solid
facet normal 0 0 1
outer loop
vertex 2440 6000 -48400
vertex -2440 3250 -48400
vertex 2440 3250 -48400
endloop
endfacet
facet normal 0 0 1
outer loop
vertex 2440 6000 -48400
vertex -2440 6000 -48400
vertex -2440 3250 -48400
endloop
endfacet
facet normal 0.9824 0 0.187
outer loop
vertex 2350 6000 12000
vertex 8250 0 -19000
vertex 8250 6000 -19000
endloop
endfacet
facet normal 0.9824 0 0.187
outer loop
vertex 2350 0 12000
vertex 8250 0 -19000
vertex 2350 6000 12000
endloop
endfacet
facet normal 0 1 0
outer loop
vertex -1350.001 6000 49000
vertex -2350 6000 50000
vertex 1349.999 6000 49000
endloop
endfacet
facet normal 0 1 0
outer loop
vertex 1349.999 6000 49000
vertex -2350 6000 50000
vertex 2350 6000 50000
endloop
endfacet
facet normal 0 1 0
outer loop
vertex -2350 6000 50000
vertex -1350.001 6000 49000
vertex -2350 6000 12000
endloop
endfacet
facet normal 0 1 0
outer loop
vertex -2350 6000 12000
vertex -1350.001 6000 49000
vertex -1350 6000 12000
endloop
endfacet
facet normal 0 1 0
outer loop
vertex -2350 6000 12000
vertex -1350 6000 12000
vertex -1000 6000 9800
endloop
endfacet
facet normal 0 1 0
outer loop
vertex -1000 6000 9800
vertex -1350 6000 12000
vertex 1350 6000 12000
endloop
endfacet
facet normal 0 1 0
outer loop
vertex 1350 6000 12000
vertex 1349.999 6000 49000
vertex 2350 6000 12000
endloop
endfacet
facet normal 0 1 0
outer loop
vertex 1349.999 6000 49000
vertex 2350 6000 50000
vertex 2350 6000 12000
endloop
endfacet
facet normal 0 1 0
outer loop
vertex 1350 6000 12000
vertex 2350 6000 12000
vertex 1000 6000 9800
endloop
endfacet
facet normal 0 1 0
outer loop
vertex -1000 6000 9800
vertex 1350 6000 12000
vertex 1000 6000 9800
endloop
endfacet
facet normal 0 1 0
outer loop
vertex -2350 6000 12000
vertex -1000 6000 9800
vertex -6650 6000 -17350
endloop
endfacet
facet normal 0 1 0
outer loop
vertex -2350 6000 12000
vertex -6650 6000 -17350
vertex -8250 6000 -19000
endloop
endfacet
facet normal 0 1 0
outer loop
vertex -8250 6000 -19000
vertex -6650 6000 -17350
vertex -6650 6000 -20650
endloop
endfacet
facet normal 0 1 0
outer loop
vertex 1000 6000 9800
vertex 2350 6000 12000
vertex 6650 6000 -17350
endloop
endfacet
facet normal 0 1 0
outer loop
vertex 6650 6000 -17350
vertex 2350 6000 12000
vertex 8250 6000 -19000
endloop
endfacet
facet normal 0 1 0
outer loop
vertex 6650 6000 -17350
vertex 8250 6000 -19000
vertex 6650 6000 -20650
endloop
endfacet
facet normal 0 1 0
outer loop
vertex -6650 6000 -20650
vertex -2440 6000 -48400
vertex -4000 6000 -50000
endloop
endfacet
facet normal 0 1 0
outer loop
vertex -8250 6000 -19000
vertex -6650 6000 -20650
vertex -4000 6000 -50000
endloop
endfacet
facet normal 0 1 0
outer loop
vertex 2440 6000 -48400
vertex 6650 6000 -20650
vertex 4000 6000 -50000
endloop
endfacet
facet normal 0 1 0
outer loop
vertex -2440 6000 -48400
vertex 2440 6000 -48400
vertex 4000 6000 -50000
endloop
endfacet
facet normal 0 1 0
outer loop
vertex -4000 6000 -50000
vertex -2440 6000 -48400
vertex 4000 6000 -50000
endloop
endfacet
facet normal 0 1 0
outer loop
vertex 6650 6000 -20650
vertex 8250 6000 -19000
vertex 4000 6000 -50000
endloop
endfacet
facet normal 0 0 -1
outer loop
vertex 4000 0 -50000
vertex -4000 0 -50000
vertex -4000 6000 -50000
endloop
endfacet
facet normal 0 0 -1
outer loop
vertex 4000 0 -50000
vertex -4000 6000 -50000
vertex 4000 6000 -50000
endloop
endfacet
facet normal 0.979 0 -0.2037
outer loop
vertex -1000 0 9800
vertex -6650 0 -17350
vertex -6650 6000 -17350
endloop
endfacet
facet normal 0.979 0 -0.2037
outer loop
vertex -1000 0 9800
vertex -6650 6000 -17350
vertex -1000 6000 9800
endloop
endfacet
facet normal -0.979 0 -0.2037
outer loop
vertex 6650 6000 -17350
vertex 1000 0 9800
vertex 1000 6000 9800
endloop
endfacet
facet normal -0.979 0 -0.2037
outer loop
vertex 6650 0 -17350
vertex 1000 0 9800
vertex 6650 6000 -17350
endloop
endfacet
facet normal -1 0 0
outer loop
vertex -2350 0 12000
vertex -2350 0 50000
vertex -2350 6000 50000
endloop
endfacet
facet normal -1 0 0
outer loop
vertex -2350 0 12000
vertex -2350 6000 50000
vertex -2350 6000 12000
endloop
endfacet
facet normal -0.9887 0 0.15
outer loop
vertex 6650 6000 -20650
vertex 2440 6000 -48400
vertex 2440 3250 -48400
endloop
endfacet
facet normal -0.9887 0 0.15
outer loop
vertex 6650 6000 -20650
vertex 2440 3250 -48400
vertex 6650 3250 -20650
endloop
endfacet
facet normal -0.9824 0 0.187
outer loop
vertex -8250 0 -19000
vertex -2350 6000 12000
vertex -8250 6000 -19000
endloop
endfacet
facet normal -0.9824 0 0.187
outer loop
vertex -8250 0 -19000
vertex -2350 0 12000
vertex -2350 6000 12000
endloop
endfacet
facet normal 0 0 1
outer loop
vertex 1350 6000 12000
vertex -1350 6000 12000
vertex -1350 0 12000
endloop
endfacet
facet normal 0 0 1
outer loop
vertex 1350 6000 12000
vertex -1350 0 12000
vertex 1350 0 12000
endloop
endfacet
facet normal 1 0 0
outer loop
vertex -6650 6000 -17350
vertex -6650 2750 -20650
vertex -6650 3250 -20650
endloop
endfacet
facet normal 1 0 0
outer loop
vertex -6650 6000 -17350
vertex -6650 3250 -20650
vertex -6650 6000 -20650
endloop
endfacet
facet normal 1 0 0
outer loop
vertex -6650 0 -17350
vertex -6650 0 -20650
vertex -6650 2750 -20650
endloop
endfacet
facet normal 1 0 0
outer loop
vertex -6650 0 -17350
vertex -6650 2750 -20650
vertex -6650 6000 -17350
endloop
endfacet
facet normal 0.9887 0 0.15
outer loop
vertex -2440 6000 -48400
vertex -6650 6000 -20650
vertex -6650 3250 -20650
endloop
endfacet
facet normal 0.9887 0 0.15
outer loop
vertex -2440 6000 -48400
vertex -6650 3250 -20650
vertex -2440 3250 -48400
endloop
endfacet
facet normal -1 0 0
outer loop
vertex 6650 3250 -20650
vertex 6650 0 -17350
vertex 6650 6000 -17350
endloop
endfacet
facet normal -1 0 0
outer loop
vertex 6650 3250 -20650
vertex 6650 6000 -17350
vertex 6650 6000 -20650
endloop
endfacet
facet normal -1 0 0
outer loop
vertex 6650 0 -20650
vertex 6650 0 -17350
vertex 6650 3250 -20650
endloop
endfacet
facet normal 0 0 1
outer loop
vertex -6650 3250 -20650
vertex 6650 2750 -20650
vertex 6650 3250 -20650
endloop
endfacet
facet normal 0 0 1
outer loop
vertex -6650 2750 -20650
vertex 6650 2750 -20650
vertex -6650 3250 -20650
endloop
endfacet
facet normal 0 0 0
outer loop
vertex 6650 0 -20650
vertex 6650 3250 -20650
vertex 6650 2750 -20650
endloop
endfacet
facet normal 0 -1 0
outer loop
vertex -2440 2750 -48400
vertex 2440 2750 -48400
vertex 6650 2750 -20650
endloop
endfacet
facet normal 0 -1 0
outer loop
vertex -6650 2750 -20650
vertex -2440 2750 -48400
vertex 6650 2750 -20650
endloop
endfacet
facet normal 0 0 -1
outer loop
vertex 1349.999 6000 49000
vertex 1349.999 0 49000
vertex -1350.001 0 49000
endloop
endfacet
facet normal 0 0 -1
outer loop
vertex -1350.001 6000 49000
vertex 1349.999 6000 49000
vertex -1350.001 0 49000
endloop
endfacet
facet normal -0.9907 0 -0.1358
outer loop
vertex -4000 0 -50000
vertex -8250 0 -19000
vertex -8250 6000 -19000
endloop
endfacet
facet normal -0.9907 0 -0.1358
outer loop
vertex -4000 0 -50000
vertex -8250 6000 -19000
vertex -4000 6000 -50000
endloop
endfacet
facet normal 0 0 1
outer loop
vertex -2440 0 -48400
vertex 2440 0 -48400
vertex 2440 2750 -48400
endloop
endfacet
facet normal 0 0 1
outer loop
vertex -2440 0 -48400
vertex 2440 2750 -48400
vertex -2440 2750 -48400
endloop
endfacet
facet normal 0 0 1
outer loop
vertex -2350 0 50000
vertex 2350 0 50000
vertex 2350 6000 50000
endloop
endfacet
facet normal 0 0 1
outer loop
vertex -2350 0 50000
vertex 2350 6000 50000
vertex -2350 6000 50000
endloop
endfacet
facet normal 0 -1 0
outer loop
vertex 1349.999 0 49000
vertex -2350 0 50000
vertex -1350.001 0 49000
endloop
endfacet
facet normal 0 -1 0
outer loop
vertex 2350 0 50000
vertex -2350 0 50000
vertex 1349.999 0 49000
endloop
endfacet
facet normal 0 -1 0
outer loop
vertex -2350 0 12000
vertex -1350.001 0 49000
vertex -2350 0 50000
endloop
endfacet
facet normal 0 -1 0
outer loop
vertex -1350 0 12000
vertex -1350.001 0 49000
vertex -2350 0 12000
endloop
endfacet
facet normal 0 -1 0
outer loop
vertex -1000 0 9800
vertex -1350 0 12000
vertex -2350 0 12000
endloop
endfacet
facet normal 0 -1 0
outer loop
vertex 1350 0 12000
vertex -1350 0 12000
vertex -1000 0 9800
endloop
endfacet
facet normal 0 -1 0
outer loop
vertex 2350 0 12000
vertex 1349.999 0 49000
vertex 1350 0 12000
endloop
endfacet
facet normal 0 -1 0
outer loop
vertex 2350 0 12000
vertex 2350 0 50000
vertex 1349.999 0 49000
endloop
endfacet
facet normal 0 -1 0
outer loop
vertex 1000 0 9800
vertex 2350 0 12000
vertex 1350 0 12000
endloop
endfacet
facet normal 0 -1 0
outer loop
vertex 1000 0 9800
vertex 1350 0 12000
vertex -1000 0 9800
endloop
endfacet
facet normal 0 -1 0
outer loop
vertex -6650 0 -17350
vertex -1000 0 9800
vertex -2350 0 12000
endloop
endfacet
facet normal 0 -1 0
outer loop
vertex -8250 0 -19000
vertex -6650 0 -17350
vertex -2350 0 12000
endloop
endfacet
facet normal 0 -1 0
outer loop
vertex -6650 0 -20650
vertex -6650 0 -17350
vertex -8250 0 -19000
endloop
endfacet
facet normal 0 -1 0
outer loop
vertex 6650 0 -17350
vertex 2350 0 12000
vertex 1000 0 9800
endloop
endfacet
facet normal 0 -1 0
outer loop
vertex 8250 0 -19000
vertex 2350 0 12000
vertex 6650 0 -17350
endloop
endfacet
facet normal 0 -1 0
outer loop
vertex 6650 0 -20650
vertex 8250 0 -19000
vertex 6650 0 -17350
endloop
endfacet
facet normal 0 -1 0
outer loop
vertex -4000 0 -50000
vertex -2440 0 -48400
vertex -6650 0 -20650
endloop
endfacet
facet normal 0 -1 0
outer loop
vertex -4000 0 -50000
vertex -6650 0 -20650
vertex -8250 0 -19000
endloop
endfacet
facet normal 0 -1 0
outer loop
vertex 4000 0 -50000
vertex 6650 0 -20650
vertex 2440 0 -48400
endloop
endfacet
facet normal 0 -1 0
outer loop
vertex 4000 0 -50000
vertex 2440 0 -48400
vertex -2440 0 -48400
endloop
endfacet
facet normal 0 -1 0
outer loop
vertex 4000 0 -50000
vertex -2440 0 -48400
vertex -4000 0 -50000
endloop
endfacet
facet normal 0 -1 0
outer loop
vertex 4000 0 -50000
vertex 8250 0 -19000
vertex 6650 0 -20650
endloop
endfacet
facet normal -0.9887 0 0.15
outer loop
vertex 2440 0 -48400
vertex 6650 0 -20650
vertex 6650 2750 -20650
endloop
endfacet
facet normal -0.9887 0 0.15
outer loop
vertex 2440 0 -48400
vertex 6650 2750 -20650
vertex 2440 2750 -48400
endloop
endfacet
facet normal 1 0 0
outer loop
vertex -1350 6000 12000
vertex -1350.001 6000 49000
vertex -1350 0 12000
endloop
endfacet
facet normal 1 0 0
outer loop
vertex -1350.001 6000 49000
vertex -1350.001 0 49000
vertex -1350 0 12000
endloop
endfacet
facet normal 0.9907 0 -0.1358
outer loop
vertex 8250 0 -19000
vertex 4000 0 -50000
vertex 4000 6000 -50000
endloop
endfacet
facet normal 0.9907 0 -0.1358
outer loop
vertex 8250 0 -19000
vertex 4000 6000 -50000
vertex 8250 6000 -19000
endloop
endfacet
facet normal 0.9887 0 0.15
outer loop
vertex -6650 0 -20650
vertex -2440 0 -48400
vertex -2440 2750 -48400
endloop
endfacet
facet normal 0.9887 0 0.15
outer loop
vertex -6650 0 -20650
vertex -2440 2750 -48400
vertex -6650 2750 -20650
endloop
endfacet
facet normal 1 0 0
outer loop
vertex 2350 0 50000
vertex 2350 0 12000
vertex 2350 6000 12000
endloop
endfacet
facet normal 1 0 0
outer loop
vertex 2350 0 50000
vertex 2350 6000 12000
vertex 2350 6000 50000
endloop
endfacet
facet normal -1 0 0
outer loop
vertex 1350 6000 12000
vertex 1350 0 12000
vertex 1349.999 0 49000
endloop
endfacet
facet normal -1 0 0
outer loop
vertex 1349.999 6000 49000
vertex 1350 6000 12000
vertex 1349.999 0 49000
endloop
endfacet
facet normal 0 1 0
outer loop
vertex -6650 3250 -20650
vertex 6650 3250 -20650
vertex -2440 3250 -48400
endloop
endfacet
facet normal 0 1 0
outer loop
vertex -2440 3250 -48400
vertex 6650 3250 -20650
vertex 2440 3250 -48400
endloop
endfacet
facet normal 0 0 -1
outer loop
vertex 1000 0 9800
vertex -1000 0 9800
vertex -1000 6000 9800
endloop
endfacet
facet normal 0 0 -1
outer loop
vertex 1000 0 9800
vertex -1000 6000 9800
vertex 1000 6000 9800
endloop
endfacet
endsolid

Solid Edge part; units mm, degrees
sketch "Sketch1" plane through (0, 0, 0) normal (0, -1, 0) x (1, 0, 0)
  line L0 (2350, 12000) -> (2350, 50000)
  line L1 (2350, 50000) -> (-2350, 50000)
  line L2 (-2350, 50000) -> (-2350, 12000)
  line L3 (-2350, 12000) -> (-8250, -19000)
  line L4 (-8250, -19000) -> (-4000, -50000)
  line L5 (-4000, -50000) -> (4000, -50000)
  line L6 (4000, -50000) -> (8250, -19000)
  line L7 (8250, -19000) -> (2350, 12000)
extrude "Protrusion1" add sketch "Sketch1" against normal blind 6000
sketch "Sketch2" plane through (0, 0, 0) normal (0, -1, 0) x (-0.1869665, 0, 0.9823663)
  line L0 (11535.9907, -3569.7923) -> (47883.5436, -10487.5524)
  line L1 (47883.5436, -10487.5524) -> (48388.3531, -7835.1634)
  line L2 (48388.3531, -7835.1634) -> (12040.8003, -917.4034)
  line L3 (12040.8003, -917.4034) -> (11535.9907, -3569.7923)
  line L4 (9440.2232, -2814.6379) -> (-18287.3823, -3288.8673)
  line L5 (-18287.3823, -3288.8673) -> (-21529.1911, -2671.8779)
  line L6 (-21529.1911, -2671.8779) -> (-19042.5368, 10393.5938)
  line L7 (-19042.5368, 10393.5938) -> (-15800.728, 9776.6044)
  line L8 (-15800.728, 9776.6044) -> (9814.1562, -849.9053)
  line L9 (9814.1562, -849.9053) -> (9440.2232, -2814.6379)
extrude "Cutout1" cut sketch "Sketch2" against normal blind 61943.5463
sketch "Sketch3" plane through (0, 0, 0) normal (0, -1, 0) x (1, 0, 0)
  line L0 (-2440, -48400) -> (-6650, -20650)
  line L1 (-6650, -20650) -> (6650, -20650)
  line L2 (6650, -20650) -> (2440, -48400)
  line L3 (2440, -48400) -> (-2440, -48400)
extrude "Cutout2" cut sketch "Sketch3" against normal blind 2750
sketch "Sketch4" plane through (0, 6000, 0) normal (0, 1, 0) x (0.1869665, 0, -0.9823663)
  line L0 (21529.1911, -2671.8779) -> (19042.5368, 10393.5938)
  line L1 (19042.5368, 10393.5938) -> (47090.3303, 11446.1518)
  line L2 (47090.3303, 11446.1518) -> (48002.7268, 6652.2043)
  line L3 (48002.7268, 6652.2043) -> (21529.1911, -2671.8779)
extrude "Cutout3" cut sketch "Sketch4" against normal blind 2750
